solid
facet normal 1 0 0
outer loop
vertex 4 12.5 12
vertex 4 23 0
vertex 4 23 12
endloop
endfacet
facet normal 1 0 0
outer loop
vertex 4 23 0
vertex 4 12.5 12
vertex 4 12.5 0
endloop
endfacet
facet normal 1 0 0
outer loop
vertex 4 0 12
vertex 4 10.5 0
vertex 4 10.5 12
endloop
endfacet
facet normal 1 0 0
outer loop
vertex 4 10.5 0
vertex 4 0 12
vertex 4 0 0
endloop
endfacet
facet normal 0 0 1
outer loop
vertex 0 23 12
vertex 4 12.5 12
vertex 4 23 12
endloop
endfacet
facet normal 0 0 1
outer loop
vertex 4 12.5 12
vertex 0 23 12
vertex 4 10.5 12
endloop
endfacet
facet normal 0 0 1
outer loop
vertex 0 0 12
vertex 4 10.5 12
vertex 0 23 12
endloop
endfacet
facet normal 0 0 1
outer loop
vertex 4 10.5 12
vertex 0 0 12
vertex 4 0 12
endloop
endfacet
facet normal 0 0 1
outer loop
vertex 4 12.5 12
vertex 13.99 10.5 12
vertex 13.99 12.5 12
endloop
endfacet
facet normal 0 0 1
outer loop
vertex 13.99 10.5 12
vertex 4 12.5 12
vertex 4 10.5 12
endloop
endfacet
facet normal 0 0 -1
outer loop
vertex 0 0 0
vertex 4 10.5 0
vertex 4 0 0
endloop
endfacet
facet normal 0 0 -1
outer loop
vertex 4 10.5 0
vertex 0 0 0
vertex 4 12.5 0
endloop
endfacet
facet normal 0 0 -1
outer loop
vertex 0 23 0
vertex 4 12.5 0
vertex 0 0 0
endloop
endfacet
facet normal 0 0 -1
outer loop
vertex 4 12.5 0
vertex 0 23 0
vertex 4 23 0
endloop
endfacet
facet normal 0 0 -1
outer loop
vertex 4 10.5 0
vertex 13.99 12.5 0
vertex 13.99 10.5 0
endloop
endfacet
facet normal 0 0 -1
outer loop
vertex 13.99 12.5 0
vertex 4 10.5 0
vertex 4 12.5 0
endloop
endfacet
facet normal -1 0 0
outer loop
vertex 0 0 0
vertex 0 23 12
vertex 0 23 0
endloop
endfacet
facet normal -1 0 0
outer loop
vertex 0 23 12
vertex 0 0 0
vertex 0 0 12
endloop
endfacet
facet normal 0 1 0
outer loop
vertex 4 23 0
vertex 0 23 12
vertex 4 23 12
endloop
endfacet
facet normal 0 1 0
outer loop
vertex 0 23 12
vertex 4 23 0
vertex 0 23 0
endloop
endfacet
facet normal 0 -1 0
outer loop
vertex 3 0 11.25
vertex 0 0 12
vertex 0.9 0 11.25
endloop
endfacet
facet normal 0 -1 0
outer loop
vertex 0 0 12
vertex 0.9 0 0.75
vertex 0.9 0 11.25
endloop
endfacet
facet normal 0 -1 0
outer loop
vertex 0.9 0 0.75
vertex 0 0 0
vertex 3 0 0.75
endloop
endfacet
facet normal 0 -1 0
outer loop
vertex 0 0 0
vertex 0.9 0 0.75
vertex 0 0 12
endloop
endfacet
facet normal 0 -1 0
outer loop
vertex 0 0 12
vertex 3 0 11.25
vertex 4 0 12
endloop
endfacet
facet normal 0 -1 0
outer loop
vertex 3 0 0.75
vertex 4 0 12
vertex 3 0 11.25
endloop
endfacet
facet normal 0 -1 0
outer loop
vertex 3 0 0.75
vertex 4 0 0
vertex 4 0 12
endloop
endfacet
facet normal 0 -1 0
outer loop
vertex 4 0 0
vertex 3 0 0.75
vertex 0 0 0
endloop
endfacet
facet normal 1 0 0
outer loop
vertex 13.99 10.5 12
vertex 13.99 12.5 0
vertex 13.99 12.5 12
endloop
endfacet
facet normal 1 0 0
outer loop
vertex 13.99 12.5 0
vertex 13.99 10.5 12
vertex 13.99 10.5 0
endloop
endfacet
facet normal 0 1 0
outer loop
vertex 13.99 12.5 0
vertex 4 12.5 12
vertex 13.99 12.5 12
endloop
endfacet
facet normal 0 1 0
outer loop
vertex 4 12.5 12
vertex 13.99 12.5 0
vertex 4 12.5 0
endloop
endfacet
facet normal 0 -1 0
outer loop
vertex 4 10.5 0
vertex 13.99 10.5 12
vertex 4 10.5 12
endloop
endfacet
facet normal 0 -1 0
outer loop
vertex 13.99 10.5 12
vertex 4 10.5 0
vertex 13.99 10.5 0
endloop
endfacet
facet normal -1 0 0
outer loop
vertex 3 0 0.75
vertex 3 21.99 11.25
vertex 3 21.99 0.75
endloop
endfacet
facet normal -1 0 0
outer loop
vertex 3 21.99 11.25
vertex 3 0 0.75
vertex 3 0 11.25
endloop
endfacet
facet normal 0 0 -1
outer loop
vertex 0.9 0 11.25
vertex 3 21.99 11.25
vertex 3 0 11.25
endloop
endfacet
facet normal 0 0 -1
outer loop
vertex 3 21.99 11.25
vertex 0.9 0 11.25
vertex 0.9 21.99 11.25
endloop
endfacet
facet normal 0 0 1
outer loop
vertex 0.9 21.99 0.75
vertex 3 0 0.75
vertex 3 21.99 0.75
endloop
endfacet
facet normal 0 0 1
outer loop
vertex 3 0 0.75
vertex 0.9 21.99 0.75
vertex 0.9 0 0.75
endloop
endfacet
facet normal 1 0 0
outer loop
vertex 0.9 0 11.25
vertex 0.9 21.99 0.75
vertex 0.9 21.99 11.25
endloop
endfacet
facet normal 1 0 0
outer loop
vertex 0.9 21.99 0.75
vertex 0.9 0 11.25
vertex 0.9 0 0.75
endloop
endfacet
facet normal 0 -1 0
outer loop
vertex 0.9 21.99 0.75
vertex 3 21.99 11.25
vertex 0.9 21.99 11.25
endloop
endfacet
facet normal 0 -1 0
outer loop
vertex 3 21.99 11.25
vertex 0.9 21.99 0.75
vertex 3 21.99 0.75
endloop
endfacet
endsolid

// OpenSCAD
$fa=6;
$fs=0.1;
EPS=0.01;

Height=12;
Width=4;
Depth=23;
MagnetThickness=2.1;
MagnetHeight=10.5;
HandleWidth=2;

difference() {
    union() {
        cube(size=[Width,Depth,Height]);
        translate([Width-EPS,Depth/2-HandleWidth/2,0])
            cube(size=[10,HandleWidth,Height]);
    }
    translate([0.9, -EPS, (Height-MagnetHeight)/2])
        cube(size=[MagnetThickness,Depth-1,MagnetHeight]);
}

/*
difference() {
    union() {
        cylinder(r=45/2, h=BaseHeight);
        translate([0,0,BaseHeight]) cylinder(r=15,h=InnerHeight);
    }
    translate([0,0,-EPS]) cylinder(r=MetalRodRadius, h=BaseHeight+InnerHeight+2*EPS);
    translate([0,0,-EPS]) cylinder(r=BearingR, h=BearingHeight+EPS);
}
*/
